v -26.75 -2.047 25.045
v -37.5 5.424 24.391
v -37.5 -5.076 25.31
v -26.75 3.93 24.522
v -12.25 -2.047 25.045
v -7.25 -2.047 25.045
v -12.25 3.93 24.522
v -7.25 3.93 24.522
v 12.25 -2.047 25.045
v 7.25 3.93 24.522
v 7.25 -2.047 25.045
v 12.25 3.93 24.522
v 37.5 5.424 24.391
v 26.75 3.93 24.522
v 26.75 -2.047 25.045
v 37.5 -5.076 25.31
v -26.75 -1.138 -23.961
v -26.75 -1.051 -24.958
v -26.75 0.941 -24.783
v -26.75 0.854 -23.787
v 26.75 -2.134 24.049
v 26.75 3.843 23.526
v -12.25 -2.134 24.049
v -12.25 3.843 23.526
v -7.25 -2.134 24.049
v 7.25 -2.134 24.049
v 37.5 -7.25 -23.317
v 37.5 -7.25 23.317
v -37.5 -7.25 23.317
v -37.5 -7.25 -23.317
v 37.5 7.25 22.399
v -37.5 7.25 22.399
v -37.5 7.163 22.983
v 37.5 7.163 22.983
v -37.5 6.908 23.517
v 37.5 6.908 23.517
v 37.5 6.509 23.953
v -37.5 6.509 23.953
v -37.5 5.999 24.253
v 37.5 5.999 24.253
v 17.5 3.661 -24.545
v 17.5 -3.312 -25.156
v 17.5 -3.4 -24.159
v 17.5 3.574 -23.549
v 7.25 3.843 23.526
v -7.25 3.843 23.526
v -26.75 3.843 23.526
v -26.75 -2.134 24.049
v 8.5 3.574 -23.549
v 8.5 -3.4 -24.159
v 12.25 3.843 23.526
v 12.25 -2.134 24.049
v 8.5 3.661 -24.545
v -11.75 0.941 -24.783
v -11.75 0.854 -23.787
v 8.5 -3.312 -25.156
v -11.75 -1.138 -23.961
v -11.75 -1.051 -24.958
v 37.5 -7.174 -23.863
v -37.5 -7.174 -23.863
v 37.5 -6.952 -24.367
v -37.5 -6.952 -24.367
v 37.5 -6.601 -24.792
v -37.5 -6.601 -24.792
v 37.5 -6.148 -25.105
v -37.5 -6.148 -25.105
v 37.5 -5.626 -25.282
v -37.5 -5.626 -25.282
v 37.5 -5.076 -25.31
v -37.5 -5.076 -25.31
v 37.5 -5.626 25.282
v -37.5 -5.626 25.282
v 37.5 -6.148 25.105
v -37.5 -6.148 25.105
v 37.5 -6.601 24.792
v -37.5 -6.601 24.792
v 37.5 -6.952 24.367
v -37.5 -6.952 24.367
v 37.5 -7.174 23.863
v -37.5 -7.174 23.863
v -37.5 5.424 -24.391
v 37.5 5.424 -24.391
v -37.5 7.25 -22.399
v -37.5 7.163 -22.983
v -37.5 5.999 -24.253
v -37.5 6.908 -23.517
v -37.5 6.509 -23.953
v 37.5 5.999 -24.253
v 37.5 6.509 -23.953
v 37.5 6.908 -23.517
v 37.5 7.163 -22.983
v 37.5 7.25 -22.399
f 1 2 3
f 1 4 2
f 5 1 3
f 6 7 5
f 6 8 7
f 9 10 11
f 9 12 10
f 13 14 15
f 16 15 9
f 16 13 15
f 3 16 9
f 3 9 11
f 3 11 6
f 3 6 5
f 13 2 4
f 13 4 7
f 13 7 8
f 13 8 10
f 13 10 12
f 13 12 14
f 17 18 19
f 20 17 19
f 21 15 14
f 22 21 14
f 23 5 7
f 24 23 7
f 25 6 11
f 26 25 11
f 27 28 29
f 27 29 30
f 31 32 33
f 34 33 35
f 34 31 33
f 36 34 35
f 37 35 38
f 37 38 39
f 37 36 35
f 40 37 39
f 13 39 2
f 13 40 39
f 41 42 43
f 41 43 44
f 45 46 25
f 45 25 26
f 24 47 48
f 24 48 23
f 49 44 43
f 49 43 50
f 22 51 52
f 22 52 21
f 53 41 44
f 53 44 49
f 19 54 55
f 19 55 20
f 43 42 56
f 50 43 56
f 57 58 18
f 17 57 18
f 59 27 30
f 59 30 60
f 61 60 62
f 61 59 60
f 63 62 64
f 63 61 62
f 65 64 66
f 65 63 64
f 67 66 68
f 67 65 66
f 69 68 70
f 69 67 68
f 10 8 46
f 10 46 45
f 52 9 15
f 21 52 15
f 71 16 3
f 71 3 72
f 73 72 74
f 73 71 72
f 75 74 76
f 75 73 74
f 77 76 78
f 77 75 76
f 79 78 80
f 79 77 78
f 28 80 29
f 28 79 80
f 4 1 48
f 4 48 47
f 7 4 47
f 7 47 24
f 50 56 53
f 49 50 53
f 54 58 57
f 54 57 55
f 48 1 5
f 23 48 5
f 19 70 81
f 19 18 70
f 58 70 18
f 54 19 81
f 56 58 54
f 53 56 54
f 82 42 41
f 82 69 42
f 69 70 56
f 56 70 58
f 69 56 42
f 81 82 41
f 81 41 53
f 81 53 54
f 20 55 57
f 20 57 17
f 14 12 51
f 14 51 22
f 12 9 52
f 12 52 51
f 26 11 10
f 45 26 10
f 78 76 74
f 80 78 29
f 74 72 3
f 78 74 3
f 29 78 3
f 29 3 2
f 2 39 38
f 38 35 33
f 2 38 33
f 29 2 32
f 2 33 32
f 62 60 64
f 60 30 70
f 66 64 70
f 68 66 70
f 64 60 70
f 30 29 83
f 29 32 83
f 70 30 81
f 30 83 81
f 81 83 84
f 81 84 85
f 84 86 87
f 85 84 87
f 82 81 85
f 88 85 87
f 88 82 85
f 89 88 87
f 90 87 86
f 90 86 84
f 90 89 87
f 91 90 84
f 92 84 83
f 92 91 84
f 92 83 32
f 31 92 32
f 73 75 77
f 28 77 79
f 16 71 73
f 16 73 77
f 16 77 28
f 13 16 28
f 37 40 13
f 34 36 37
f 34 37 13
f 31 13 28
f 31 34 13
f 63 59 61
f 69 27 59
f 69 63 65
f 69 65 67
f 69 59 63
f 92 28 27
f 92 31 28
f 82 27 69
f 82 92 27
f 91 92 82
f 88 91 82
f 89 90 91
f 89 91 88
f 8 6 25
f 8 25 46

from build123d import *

# Parameters (mm, degrees)
BOSS_EXTRUDE1_DEPTH = 37.5
SKETCH2_W           = 14.5
SKETCH2_H           = 6
CUT_EXTRUDE1_DEPTH  = 1
SKETCH3_W           = 15
SKETCH3_H           = 2
SKETCH3_W_2         = 9
SKETCH3_H_2         = 7
CUT_EXTRUDE2_DEPTH  = 1


with BuildPart() as part:
    # Sketch1 → Boss-Extrude1 (new, symmetric)
    with BuildSketch(Plane(origin=(0, 0, 0), x_dir=(0, 0, -1), z_dir=(1, 0, 0))):
        with BuildLine():
            Line((-24.391141427, 5.424311485), (-25.309772394, -5.075688515))
            ThreePointArc((-25.309772394, -5.075688515), (-24.791937671, -6.601180415), (-23.317382998, -7.25))
            Line((-23.317382998, -7.25), (23.317382998, -7.25))
            ThreePointArc((23.317382998, -7.25), (24.791937671, -6.601180415), (25.309772394, -5.075688515))
            Line((25.309772394, -5.075688515), (24.391141427, 5.424311485))
            ThreePointArc((24.391141427, 5.424311485), (23.749932446, 6.724554674), (22.398752031, 7.25))
            Line((22.398752031, 7.25), (-22.398752031, 7.25))
            ThreePointArc((-22.398752031, 7.25), (-23.749932446, 6.724554674), (-24.391141427, 5.424311485))
        make_face()
    extrude(amount=BOSS_EXTRUDE1_DEPTH, both=True)

    # Sketch2 → Cut-Extrude1 (cut)
    with BuildSketch(Plane(origin=(0, 2.15894237, 24.676824207), x_dir=(1, 0, 0), z_dir=(0, 0.08715574274765166, 0.9961946980917462))):
        with Locations((-19.5, -1.222157705)):
            Rectangle(SKETCH2_W, SKETCH2_H)
        with Locations((0, -1.222157705)):
            Rectangle(SKETCH2_W, SKETCH2_H)
        with Locations((19.5, -1.222157705)):
            Rectangle(SKETCH2_W, SKETCH2_H)
    extrude(amount=-CUT_EXTRUDE1_DEPTH, mode=Mode.SUBTRACT)

    # Sketch3 → Cut-Extrude2 (cut)
    with BuildSketch(Plane(origin=(0, 2.15894237, -24.676824207), x_dir=(-1, 0, 0), z_dir=(0, 0.08715574274765166, -0.9961946980917462))):
        with Locations((19.25, -2.222157705)):
            Rectangle(SKETCH3_W, SKETCH3_H)
        with Locations((-13, -1.992211852)):
            Rectangle(SKETCH3_W_2, SKETCH3_H_2)
    extrude(amount=-CUT_EXTRUDE2_DEPTH, mode=Mode.SUBTRACT)


solid = part.part
